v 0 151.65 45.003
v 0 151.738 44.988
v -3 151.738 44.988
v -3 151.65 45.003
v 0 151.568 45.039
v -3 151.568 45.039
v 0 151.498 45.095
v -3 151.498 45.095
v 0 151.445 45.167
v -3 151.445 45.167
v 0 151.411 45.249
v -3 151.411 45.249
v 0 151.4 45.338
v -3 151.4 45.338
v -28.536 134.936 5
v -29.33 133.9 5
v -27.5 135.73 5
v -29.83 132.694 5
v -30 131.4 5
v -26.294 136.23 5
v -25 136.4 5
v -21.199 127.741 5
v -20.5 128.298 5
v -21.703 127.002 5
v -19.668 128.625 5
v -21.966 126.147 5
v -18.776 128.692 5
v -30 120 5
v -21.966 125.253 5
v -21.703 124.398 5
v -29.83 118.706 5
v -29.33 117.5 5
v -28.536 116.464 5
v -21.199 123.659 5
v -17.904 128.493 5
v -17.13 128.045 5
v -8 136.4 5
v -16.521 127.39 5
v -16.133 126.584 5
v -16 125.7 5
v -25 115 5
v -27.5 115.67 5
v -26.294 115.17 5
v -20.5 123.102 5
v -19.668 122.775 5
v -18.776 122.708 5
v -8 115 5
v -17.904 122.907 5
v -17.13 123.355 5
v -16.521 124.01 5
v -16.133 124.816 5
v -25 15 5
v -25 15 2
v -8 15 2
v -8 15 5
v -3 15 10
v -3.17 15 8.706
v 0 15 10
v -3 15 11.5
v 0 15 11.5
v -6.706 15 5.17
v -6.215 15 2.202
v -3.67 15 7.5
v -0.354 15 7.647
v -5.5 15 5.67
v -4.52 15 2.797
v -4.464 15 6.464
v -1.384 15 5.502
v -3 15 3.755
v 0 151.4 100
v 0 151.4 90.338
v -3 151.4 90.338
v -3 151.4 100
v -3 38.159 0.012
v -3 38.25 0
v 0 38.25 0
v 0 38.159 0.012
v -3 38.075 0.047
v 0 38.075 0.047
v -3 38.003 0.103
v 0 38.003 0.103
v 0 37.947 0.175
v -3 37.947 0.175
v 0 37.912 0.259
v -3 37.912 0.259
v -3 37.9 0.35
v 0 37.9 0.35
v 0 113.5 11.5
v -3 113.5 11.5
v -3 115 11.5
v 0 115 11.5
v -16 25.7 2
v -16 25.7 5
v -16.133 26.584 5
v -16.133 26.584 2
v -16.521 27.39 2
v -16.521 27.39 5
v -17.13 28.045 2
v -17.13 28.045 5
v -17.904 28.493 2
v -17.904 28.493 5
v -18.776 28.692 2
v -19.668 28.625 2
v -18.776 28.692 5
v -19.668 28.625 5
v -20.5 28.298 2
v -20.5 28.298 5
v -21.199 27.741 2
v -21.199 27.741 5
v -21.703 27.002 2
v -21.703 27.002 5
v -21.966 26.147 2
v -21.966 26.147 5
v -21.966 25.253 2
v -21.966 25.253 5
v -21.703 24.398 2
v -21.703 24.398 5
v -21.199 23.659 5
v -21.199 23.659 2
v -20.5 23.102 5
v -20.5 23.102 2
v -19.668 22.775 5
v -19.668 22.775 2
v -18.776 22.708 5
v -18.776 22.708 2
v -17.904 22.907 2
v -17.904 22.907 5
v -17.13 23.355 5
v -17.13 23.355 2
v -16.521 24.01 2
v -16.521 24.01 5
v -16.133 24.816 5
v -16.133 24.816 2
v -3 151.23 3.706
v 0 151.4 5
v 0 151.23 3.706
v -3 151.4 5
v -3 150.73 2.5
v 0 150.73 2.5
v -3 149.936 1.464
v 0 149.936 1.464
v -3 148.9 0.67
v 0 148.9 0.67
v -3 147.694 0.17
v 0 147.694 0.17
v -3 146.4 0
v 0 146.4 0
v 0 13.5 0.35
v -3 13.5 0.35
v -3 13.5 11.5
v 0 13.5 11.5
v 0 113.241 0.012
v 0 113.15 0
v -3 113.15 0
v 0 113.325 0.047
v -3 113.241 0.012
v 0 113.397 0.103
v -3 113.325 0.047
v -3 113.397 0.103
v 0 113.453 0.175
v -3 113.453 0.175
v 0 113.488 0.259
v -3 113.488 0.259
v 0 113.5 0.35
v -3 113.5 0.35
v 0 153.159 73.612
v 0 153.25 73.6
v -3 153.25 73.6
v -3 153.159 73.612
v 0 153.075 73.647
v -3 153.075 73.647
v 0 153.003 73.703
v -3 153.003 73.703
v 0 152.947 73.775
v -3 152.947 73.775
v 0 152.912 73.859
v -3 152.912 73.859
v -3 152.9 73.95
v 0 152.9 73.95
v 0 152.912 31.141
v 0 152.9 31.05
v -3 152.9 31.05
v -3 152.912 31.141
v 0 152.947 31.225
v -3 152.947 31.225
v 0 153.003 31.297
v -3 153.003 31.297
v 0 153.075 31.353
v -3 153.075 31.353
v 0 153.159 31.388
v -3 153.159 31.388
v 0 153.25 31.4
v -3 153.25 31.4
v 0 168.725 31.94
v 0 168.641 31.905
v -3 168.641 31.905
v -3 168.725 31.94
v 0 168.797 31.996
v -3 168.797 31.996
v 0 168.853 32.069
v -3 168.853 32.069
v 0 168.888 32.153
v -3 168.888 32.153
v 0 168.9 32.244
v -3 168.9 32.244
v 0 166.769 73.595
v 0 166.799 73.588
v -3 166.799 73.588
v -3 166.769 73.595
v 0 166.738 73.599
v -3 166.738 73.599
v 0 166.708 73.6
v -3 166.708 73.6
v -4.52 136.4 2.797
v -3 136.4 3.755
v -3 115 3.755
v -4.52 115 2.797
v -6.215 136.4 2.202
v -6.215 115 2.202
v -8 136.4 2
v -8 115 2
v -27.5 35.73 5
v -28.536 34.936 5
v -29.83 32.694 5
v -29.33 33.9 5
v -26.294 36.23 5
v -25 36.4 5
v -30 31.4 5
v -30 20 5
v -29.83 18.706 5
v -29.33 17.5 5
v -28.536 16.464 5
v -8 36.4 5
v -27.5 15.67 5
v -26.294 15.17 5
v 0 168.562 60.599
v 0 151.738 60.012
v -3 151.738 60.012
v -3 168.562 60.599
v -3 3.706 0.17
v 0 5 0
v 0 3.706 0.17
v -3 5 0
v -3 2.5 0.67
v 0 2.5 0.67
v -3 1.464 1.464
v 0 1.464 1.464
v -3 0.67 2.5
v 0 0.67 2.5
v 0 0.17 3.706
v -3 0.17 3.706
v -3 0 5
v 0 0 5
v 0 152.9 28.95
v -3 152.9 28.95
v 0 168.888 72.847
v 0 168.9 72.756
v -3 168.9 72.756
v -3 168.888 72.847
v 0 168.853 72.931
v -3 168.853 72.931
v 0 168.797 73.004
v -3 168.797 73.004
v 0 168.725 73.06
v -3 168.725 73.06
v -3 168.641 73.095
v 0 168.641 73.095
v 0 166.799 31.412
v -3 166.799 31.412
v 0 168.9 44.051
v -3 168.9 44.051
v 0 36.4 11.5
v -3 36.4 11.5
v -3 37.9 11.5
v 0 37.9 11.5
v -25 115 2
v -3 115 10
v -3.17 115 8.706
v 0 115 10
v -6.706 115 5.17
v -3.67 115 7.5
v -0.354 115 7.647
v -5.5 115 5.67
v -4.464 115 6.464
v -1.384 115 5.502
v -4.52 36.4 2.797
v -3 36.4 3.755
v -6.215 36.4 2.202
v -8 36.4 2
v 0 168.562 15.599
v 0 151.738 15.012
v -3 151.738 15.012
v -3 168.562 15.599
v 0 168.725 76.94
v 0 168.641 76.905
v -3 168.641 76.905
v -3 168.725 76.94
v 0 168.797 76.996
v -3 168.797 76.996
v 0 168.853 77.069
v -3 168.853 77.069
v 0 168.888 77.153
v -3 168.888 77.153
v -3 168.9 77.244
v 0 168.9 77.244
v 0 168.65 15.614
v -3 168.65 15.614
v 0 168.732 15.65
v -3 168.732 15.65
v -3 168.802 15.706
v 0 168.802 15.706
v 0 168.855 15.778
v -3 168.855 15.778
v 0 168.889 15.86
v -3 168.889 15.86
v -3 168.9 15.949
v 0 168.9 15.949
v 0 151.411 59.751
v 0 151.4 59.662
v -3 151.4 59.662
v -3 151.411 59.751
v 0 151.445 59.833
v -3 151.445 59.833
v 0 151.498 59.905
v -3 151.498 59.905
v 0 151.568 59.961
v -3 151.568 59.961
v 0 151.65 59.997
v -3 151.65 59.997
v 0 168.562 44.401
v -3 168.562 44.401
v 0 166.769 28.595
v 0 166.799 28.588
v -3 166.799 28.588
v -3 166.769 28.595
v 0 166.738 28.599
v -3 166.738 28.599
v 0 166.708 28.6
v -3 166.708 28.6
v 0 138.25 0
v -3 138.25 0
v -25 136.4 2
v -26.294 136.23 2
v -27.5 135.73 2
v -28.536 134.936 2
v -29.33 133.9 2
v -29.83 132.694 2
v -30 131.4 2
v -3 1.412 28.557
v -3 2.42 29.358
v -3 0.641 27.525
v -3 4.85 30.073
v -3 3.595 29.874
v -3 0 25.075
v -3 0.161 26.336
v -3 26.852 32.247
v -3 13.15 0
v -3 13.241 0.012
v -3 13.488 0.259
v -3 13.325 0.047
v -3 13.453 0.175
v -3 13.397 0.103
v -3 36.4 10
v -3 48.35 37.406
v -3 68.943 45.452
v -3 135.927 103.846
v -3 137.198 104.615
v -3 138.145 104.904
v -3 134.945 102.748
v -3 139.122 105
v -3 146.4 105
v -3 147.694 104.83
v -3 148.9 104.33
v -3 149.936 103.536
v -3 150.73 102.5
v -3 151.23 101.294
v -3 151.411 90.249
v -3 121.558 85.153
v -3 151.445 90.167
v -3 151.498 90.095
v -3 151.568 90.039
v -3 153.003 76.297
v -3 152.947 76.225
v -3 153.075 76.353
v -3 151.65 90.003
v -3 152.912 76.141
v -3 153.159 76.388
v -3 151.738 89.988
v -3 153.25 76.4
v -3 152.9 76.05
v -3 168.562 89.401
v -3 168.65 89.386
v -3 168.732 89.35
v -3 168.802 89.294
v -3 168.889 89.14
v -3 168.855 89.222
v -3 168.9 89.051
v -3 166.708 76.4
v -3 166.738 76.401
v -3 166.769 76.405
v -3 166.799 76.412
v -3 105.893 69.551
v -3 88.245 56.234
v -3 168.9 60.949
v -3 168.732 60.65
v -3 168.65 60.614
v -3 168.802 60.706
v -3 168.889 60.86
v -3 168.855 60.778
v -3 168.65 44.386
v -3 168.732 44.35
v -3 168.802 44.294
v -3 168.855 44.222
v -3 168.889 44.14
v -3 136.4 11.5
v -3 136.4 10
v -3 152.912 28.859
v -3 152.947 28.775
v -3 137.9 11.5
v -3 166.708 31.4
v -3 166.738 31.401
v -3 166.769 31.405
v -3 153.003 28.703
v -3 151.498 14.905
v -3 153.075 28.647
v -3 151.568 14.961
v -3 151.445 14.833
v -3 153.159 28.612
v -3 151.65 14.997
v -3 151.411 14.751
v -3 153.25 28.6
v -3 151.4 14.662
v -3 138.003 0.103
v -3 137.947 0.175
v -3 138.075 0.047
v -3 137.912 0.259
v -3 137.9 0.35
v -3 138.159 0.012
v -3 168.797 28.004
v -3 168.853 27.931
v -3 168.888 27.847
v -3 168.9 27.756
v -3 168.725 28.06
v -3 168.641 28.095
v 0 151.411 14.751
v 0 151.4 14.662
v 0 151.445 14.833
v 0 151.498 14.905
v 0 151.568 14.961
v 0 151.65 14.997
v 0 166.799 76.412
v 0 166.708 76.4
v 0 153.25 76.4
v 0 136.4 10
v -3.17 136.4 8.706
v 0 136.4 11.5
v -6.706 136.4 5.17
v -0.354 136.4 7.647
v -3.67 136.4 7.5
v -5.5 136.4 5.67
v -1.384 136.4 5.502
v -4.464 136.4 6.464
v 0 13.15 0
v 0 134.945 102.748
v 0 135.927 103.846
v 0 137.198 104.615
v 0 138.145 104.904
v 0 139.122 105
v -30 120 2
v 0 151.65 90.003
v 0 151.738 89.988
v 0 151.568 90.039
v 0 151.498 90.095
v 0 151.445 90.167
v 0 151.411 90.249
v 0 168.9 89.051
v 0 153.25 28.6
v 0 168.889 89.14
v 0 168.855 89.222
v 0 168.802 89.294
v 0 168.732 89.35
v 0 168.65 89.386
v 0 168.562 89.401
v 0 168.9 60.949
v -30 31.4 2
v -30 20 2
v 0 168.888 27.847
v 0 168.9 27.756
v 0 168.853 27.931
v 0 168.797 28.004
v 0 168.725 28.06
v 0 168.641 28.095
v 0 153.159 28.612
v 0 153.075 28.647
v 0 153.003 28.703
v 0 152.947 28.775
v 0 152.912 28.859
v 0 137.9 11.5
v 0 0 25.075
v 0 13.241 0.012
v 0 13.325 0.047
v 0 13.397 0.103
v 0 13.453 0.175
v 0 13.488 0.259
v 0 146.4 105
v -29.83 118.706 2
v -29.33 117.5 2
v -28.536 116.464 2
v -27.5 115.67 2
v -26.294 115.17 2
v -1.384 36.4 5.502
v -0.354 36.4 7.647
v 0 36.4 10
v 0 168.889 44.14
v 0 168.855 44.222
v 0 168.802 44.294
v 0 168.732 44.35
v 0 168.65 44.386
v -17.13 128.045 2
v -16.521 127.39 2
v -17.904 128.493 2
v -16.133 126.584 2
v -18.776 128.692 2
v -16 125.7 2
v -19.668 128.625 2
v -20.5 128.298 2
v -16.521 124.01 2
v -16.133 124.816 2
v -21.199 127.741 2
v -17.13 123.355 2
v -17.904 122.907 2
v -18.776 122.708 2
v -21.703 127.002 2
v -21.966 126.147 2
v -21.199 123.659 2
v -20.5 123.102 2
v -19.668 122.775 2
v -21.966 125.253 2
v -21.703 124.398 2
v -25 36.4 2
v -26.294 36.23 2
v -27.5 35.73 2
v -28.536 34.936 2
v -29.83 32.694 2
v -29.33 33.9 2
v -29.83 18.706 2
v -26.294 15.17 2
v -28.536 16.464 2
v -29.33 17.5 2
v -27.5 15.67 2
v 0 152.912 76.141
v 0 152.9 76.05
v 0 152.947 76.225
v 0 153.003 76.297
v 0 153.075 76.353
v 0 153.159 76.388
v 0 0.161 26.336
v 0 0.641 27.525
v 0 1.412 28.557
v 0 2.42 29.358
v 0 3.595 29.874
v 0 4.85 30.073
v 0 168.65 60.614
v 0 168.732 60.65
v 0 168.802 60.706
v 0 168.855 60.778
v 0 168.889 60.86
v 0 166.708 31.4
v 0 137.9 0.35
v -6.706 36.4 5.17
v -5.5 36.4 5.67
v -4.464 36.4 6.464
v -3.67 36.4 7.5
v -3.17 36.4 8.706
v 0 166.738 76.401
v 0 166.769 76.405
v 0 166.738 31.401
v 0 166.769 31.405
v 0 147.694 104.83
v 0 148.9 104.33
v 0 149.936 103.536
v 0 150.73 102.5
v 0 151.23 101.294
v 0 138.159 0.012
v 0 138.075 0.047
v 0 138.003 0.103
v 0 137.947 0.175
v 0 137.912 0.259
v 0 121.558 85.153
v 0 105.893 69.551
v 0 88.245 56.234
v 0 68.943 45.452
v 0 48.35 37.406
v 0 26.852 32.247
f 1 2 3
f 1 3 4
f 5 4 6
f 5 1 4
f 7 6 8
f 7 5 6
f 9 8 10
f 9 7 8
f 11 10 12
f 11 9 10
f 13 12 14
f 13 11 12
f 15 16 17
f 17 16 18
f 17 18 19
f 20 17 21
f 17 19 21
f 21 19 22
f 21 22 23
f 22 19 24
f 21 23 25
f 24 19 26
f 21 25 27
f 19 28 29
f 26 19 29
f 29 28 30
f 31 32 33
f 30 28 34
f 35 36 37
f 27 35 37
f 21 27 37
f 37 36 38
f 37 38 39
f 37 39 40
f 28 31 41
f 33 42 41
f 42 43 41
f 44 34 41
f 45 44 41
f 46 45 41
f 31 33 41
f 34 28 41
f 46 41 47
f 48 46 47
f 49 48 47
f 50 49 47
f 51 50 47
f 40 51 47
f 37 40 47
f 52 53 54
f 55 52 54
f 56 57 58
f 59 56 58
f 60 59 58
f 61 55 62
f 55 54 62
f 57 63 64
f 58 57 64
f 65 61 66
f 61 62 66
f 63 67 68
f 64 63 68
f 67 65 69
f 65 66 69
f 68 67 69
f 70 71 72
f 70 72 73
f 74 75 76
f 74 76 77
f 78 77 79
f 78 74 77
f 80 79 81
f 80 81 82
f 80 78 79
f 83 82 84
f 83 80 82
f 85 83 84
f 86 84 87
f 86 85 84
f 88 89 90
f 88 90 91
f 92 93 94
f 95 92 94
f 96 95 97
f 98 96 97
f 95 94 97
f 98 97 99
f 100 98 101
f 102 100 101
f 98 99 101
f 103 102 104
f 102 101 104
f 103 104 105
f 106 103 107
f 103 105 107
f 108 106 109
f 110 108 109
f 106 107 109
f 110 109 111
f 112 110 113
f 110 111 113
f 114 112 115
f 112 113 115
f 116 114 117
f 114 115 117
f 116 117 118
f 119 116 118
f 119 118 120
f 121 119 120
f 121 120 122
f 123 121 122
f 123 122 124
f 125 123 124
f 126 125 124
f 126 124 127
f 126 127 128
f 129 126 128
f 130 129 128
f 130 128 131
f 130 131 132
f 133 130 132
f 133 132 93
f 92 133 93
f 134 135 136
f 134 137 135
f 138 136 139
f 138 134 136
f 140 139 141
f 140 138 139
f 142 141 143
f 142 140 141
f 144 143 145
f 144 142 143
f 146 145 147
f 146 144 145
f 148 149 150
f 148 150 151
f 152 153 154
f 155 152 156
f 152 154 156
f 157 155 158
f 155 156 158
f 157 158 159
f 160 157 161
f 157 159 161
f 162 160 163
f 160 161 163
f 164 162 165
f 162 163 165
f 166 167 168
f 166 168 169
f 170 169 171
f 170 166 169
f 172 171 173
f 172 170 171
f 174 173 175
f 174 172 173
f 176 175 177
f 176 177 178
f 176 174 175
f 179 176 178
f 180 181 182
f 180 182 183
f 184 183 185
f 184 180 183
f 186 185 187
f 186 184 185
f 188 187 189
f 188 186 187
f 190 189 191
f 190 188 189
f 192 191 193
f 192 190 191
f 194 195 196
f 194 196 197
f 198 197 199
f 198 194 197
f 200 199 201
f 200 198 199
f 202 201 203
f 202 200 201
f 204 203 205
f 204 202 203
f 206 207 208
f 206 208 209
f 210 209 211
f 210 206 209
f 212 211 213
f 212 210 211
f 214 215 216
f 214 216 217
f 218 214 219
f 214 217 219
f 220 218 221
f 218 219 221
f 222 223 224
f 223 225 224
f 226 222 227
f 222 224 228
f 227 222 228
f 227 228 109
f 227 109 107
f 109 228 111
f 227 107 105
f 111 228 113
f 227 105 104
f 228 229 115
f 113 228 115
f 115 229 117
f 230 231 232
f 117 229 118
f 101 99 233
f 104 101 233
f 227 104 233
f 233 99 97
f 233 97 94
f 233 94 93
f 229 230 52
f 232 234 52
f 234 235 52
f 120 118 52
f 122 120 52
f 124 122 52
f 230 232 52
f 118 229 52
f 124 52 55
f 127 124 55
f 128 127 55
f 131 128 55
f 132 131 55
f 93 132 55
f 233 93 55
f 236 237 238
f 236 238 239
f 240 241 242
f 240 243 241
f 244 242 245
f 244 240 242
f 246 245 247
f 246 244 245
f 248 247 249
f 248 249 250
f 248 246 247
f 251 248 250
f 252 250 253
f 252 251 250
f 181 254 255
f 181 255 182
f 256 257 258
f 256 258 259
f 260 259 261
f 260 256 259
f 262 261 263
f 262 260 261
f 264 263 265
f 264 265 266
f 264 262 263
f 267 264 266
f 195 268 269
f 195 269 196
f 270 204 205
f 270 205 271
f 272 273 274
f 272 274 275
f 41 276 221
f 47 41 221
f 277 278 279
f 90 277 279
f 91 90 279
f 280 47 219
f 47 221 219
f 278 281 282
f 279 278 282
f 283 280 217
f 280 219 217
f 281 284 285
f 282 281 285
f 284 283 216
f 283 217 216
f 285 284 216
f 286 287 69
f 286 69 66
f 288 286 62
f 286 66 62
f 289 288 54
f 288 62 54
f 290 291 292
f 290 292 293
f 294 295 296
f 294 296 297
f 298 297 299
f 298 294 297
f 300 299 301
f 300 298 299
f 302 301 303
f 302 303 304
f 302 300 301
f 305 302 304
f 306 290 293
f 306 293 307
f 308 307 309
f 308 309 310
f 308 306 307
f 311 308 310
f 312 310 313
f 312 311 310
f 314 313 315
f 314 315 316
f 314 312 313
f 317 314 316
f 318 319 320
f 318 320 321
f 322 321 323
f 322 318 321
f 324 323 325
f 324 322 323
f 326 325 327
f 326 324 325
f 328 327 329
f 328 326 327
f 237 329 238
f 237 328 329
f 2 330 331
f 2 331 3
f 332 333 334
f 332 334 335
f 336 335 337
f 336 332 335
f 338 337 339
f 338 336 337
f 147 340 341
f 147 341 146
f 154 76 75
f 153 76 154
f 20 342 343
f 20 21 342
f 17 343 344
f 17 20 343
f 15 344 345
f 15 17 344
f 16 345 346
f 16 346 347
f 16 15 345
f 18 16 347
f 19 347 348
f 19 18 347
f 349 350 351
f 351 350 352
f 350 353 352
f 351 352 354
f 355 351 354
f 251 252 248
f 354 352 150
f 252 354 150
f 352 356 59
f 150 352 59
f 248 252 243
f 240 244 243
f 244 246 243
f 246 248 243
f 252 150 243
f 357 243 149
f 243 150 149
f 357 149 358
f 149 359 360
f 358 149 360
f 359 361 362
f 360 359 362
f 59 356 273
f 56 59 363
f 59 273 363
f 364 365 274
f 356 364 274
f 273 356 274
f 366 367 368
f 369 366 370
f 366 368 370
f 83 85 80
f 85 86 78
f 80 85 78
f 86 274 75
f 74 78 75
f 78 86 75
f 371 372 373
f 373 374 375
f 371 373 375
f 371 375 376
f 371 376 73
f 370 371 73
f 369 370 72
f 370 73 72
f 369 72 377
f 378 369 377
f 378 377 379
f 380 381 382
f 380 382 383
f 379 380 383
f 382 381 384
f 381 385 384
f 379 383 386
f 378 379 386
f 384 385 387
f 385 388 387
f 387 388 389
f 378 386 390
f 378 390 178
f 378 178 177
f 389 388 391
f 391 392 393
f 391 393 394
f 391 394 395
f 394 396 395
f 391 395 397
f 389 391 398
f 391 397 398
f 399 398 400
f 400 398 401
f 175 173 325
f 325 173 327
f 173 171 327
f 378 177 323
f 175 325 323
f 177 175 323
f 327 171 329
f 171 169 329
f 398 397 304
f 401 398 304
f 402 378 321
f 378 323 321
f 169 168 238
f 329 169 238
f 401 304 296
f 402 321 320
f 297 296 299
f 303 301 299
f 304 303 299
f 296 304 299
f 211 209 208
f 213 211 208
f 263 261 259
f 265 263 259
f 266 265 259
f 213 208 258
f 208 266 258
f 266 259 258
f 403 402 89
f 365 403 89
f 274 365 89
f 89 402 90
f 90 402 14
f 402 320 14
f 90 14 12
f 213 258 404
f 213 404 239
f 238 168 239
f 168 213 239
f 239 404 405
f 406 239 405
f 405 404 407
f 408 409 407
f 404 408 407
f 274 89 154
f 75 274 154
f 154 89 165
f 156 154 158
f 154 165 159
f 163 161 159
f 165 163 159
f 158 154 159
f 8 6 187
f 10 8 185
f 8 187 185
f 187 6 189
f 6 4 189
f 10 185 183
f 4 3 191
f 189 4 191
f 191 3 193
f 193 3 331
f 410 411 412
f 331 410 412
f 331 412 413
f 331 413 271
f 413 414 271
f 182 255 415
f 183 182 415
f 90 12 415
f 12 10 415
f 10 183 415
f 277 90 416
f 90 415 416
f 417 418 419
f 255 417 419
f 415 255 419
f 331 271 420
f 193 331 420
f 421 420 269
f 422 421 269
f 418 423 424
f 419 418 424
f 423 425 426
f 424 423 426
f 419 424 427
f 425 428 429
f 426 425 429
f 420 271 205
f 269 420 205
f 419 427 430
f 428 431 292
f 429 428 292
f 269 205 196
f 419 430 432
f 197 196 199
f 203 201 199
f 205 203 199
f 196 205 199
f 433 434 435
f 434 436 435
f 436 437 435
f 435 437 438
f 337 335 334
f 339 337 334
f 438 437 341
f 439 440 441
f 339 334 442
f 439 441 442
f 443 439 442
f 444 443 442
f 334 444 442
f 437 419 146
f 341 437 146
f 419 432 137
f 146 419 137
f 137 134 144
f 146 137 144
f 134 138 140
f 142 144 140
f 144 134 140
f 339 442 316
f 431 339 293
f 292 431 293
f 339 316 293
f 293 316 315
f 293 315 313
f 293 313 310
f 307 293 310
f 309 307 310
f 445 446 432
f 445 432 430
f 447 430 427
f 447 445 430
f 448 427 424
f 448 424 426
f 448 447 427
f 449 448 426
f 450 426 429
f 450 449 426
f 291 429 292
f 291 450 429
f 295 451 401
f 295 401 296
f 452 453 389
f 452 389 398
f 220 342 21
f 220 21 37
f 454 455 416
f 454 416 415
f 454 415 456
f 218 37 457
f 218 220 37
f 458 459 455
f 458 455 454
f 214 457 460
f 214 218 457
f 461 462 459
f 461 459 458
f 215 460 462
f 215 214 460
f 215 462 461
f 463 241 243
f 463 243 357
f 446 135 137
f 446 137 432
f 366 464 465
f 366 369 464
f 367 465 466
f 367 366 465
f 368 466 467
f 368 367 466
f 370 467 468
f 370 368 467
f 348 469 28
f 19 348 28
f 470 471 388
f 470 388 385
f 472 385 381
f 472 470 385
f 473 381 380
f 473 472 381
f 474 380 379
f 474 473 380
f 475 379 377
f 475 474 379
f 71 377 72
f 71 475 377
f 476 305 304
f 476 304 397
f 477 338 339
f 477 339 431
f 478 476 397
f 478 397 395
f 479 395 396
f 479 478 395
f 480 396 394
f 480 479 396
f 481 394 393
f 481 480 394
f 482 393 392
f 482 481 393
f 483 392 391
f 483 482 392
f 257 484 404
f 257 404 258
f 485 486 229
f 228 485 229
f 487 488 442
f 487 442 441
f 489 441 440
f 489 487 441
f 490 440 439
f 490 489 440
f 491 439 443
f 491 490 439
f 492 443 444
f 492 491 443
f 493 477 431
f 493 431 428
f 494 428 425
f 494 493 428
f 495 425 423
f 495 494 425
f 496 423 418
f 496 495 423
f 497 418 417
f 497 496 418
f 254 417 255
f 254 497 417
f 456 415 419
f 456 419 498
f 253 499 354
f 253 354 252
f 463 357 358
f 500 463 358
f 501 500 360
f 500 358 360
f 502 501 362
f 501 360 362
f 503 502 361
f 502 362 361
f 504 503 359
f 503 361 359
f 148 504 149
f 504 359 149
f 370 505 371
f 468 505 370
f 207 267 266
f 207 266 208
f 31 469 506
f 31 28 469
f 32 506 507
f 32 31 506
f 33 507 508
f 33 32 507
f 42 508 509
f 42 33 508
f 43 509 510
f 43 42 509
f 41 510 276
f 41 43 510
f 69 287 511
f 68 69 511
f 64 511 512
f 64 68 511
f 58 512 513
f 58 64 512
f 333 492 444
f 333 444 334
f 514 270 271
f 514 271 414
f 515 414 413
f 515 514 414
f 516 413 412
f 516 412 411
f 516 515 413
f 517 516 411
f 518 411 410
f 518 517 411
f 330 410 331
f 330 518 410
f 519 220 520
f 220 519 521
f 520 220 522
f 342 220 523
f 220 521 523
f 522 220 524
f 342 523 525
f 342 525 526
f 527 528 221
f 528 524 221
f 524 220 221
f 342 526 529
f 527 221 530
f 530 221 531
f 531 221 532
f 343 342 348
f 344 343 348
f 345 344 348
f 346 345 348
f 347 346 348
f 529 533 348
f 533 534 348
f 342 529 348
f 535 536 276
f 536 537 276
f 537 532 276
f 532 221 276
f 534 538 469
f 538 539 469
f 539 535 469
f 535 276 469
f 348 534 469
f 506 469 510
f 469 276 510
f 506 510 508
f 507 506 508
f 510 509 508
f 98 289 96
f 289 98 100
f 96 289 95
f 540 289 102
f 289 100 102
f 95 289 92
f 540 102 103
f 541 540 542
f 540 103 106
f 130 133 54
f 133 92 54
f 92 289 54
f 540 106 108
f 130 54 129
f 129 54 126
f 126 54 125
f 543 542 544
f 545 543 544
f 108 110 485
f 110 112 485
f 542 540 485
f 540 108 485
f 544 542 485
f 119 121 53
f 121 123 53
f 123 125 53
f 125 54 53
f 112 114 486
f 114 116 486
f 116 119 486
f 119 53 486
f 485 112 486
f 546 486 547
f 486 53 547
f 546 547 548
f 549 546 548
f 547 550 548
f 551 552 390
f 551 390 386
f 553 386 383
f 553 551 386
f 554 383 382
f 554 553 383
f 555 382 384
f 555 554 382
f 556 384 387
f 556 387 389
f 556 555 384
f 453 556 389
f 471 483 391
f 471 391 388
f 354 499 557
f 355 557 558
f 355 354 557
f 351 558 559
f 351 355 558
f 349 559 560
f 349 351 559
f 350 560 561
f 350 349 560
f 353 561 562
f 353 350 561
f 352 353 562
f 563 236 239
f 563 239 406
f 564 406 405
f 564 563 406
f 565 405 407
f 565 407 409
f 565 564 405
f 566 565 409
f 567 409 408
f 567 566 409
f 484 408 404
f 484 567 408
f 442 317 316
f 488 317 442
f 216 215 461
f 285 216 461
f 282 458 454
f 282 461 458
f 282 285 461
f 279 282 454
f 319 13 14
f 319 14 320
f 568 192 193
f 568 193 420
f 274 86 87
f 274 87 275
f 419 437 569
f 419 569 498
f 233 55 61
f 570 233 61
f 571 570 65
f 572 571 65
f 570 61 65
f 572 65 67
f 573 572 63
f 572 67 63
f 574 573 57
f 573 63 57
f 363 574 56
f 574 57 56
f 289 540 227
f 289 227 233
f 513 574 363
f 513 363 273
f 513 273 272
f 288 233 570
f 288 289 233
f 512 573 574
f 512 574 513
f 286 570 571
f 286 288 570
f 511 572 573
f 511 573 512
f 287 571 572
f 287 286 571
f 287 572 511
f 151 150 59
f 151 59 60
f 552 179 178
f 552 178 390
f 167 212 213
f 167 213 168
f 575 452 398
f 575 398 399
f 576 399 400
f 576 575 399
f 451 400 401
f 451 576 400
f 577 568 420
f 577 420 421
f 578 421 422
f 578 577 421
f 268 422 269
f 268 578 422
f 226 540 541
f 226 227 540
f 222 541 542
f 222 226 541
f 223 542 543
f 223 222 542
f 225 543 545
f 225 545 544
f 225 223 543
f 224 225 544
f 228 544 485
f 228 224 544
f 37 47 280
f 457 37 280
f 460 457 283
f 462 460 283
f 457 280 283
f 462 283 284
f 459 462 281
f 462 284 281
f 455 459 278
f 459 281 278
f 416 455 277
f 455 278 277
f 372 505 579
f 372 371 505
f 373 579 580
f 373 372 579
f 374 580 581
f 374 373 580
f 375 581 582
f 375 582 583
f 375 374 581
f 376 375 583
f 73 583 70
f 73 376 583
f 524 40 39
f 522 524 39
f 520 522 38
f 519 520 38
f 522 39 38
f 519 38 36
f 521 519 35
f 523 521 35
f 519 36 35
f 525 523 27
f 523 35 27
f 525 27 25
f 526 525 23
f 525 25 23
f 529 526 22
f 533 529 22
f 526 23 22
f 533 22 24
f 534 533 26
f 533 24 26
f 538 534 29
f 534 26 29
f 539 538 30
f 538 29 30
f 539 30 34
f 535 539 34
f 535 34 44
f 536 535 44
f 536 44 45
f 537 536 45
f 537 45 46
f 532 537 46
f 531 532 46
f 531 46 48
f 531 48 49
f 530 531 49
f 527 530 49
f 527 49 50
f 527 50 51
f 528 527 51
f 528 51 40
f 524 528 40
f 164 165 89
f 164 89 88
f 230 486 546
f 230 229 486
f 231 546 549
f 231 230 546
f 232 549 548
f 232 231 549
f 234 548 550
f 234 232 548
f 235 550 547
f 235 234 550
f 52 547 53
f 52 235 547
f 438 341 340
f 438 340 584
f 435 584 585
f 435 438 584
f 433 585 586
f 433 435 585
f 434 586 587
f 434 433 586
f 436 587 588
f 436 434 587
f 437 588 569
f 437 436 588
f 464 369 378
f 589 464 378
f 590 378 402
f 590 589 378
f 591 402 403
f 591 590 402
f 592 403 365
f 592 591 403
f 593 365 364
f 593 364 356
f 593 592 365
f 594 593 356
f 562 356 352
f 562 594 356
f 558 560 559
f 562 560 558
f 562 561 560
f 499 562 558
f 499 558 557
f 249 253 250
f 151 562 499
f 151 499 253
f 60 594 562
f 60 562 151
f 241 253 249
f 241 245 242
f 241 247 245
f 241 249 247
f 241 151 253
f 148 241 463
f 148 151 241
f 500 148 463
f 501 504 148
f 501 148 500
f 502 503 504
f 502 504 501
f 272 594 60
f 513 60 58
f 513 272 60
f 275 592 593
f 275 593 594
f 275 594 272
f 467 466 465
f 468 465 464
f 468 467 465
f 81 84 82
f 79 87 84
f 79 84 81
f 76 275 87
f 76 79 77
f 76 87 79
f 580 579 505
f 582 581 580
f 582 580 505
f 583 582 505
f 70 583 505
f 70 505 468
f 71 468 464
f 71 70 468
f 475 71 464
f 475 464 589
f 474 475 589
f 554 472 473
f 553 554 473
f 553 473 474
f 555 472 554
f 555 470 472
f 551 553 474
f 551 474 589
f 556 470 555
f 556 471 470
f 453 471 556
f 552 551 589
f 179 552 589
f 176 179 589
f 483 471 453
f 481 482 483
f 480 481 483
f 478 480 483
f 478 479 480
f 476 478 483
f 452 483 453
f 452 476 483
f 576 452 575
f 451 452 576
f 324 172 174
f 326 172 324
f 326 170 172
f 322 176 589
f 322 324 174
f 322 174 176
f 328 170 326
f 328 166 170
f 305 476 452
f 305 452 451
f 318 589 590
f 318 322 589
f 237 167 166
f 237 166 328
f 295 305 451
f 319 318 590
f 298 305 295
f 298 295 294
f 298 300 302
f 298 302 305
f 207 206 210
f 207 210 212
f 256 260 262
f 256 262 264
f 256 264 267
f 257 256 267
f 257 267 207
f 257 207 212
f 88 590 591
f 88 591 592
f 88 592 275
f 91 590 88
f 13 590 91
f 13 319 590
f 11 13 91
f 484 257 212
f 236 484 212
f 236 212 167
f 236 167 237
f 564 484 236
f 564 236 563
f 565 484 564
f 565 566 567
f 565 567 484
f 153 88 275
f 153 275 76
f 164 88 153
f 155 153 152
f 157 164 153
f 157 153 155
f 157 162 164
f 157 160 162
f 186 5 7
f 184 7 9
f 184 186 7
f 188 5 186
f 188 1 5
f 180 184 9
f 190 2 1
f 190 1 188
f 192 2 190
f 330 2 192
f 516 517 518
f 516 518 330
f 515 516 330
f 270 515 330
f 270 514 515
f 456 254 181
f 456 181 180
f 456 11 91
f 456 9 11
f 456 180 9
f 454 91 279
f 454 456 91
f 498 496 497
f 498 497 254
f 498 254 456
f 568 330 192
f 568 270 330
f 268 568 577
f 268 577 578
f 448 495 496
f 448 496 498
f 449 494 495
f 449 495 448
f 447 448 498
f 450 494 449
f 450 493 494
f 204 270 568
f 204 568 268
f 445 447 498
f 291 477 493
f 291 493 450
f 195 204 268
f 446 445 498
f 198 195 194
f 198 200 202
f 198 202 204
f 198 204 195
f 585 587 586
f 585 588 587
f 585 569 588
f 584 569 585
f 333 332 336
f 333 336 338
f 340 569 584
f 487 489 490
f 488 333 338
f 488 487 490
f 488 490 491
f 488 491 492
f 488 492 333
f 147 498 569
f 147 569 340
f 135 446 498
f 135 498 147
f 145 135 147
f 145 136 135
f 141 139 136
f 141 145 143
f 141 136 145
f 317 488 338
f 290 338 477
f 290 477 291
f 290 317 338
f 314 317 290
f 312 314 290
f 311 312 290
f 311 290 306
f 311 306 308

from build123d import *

# Parameters (mm, degrees)
BASE_FLANGE1_DEPTH   = 3
EDGE_FLANGE1_START   = 13.5
EDGE_FLANGE1_DEPTH   = 24.4
EDGE_FLANGE1_START_2 = 113.5
EDGE_FLANGE1_2_DEPTH = 24.4
EDGE_FLANGE1_3_DEPTH = 1.5
EDGE_FLANGE1_START_3 = 36.4
EDGE_FLANGE1_4_DEPTH = 1.5
EDGE_FLANGE1_5_DEPTH = 1.5
EDGE_FLANGE1_START_4 = 136.4
EDGE_FLANGE1_6_DEPTH = 1.5
EDGE_FLANGE1_START_5 = 15
EDGE_FLANGE1_7_DEPTH = 21.4
EDGE_FLANGE1_START_6 = 115
EDGE_FLANGE1_8_DEPTH = 21.4
SKETCH12_R           = 3
CUT_EXTRUDE1_DEPTH   = 199.562861583
CUT_EXTRUDE2_DEPTH   = 201.701793714
FILLET1_R            = 5


# Read off the part's stored shape, not the designer's step: Edge-Flange1
# Sheet-metal steps are written as plain solids
with BuildPart() as part:
    # Sketch1 → Base-Flange1 (new body)
    with BuildSketch(Plane(origin=(0, 0, 0), x_dir=(0, 0, -1), z_dir=(1, 0, 0))):
        with BuildLine():
            Line((-89.400682252, 168.562214824), (-89.988204282, 151.737785176))
            ThreePointArc((-89.988204282, 151.737785176), (-90.094860642, 151.49823107), (-90.337991071, 151.4))
            Line((-90.337991071, 151.4), (-104.65, 151.4))
            Line((-104.65, 151.4), (-105, 151.4))
            Line((-105, 151.4), (-105, 151.05))
            Line((-105, 151.05), (-105, 136.592313107))
            Line((-105, 136.592313107), (-105, 136.4))
            Line((-105, 136.4), (-104.837845918, 136.296993093))
            ThreePointArc((-104.837845918, 136.296993093), (-50.024333792, 77.898717236), (-30.000377542, 0.349243281))
            Line((-30.000377542, 0.349243281), (-30, 0))
            Line((-30, 0), (-29.65037836, 0))
            Line((-29.65037836, 0), (-0.35, 0))
            Line((-0.35, 0), (0, 0))
            Line((0, 0), (0, 0.35))
            Line((0, 0.35), (0, 14.65))
            ThreePointArc((0, 14.65), (-0.102512627, 14.897487373), (-0.35, 15))
            Line((-0.35, 15), (-2, 15))
            Line((-2, 15), (-2, 15.7))
            Line((-2, 15.7), (-2, 35.7))
            Line((-2, 35.7), (-2, 36.4))
            Line((-2, 36.4), (-0.35, 36.4))
            ThreePointArc((-0.35, 36.4), (-0.102512627, 36.502512627), (0, 36.75))
            Line((0, 36.75), (0, 114.65))
            ThreePointArc((0, 114.65), (-0.102512627, 114.897487373), (-0.35, 115))
            Line((-0.35, 115), (-2, 115))
            Line((-2, 115), (-2, 115.7))
            Line((-2, 115.7), (-2, 135.7))
            Line((-2, 135.7), (-2, 136.4))
            Line((-2, 136.4), (-0.35, 136.4))
            ThreePointArc((-0.35, 136.4), (-0.102512627, 136.502512627), (0, 136.75))
            Line((0, 136.75), (0, 151.05))
            Line((0, 151.05), (0, 151.4))
            Line((0, 151.4), (-0.35, 151.4))
            Line((-0.35, 151.4), (-14.662008929, 151.4))
            ThreePointArc((-14.662008929, 151.4), (-14.905139358, 151.49823107), (-15.011795718, 151.737785176))
            Line((-15.011795718, 151.737785176), (-15.599317748, 168.562214824))
            ThreePointArc((-15.599317748, 168.562214824), (-15.705974108, 168.80176893), (-15.949104537, 168.9))
            Line((-15.949104537, 168.9), (-27.756435554, 168.9))
            ThreePointArc((-27.756435554, 168.9), (-27.969502054, 168.827673669), (-28.094509593, 168.640586666))
            Line((-28.094509593, 168.640586666), (-28.588074039, 166.798579077))
            ThreePointArc((-28.588074039, 166.798579077), (-28.597005701, 166.753676579), (-28.6, 166.707992411))
            Line((-28.6, 166.707992411), (-28.6, 153.25))
            ThreePointArc((-28.6, 153.25), (-28.702512627, 153.002512627), (-28.95, 152.9))
            Line((-28.95, 152.9), (-31.05, 152.9))
            ThreePointArc((-31.05, 152.9), (-31.297487373, 153.002512627), (-31.4, 153.25))
            Line((-31.4, 153.25), (-31.4, 166.707992411))
            ThreePointArc((-31.4, 166.707992411), (-31.402994299, 166.753676579), (-31.411925961, 166.798579077))
            Line((-31.411925961, 166.798579077), (-31.905490407, 168.640586666))
            ThreePointArc((-31.905490407, 168.640586666), (-32.030497946, 168.827673669), (-32.243564446, 168.9))
            Line((-32.243564446, 168.9), (-44.050895463, 168.9))
            ThreePointArc((-44.050895463, 168.9), (-44.294025892, 168.80176893), (-44.400682252, 168.562214824))
            Line((-44.400682252, 168.562214824), (-44.988204282, 151.737785176))
            ThreePointArc((-44.988204282, 151.737785176), (-45.094860642, 151.49823107), (-45.337991071, 151.4))
            Line((-45.337991071, 151.4), (-59.662008929, 151.4))
            ThreePointArc((-59.662008929, 151.4), (-59.905139358, 151.49823107), (-60.011795718, 151.737785176))
            Line((-60.011795718, 151.737785176), (-60.599317748, 168.562214824))
            ThreePointArc((-60.599317748, 168.562214824), (-60.705974108, 168.80176893), (-60.949104537, 168.9))
            Line((-60.949104537, 168.9), (-72.756435554, 168.9))
            ThreePointArc((-72.756435554, 168.9), (-72.969502054, 168.827673669), (-73.094509593, 168.640586666))
            Line((-73.094509593, 168.640586666), (-73.588074039, 166.798579077))
            ThreePointArc((-73.588074039, 166.798579077), (-73.597005701, 166.753676579), (-73.6, 166.707992411))
            Line((-73.6, 166.707992411), (-73.6, 153.25))
            ThreePointArc((-73.6, 153.25), (-73.702512627, 153.002512627), (-73.95, 152.9))
            Line((-73.95, 152.9), (-76.05, 152.9))
            ThreePointArc((-76.05, 152.9), (-76.297487373, 153.002512627), (-76.4, 153.25))
            Line((-76.4, 153.25), (-76.4, 166.707992411))
            ThreePointArc((-76.4, 166.707992411), (-76.402994299, 166.753676579), (-76.411925961, 166.798579077))
            Line((-76.411925961, 166.798579077), (-76.905490407, 168.640586666))
            ThreePointArc((-76.905490407, 168.640586666), (-77.030497946, 168.827673669), (-77.243564446, 168.9))
            Line((-77.243564446, 168.9), (-89.050895463, 168.9))
            ThreePointArc((-89.050895463, 168.9), (-89.294025892, 168.80176893), (-89.400682252, 168.562214824))
        make_face()
    extrude(amount=-BASE_FLANGE1_DEPTH)

    # Edge-Flange1 outline → Edge-Flange1 (cut)
    with BuildSketch(Plane(origin=(0, 0, 0), x_dir=(1, 0, 0), z_dir=(0, 1, 0)).offset(EDGE_FLANGE1_START)):
        with BuildLine():
            Line((0, -2), (-3, -2))
            Line((-3, -2), (-3, -3.755002002))
            ThreePointArc((-3, -3.755002002), (-0.788897449, -6.535898385), (0, -10))
            Line((0, -10), (0, -2))
        make_face()
    extrude(amount=EDGE_FLANGE1_DEPTH, mode=Mode.SUBTRACT)

    # Edge-Flange1 2 outline → Edge-Flange1 2 (cut)
    with BuildSketch(Plane(origin=(0, 0, 0), x_dir=(1, 0, 0), z_dir=(0, 1, 0)).offset(EDGE_FLANGE1_START_2)):
        with BuildLine():
            Line((0, -2), (-3, -2))
            Line((-3, -2), (-3, -3.755002002))
            ThreePointArc((-3, -3.755002002), (-0.788897449, -6.535898385), (0, -10))
            Line((0, -10), (0, -2))
        make_face()
    extrude(amount=EDGE_FLANGE1_2_DEPTH, mode=Mode.SUBTRACT)

    # Edge-Flange1 3 outline → Edge-Flange1 3 (cut)
    with BuildSketch(Plane(origin=(0, 0, 0), x_dir=(1, 0, 0), z_dir=(0, 1, 0)).offset(EDGE_FLANGE1_START)):
        with BuildLine():
            ThreePointArc((0, -10), (-0.788897449, -6.535898385), (-3, -3.755002002))
            Line((-3, -3.755002002), (-3, -11.5))
            Line((-3, -11.5), (0, -11.5))
            Line((0, -11.5), (0, -10))
        make_face()
    extrude(amount=EDGE_FLANGE1_3_DEPTH, mode=Mode.SUBTRACT)

    # Edge-Flange1 4 outline → Edge-Flange1 4 (cut)
    with BuildSketch(Plane(origin=(0, 0, 0), x_dir=(1, 0, 0), z_dir=(0, 1, 0)).offset(EDGE_FLANGE1_START_3)):
        with BuildLine():
            ThreePointArc((0, -10), (-0.788897449, -6.535898385), (-3, -3.755002002))
            Line((-3, -3.755002002), (-3, -11.5))
            Line((-3, -11.5), (0, -11.5))
            Line((0, -11.5), (0, -10))
        make_face()
    extrude(amount=EDGE_FLANGE1_4_DEPTH, mode=Mode.SUBTRACT)

    # Edge-Flange1 5 outline → Edge-Flange1 5 (cut)
    with BuildSketch(Plane(origin=(0, 0, 0), x_dir=(1, 0, 0), z_dir=(0, 1, 0)).offset(EDGE_FLANGE1_START_2)):
        with BuildLine():
            ThreePointArc((0, -10), (-0.788897449, -6.535898385), (-3, -3.755002002))
            Line((-3, -3.755002002), (-3, -11.5))
            Line((-3, -11.5), (0, -11.5))
            Line((0, -11.5), (0, -10))
        make_face()
    extrude(amount=EDGE_FLANGE1_5_DEPTH, mode=Mode.SUBTRACT)

    # Edge-Flange1 6 outline → Edge-Flange1 6 (cut)
    with BuildSketch(Plane(origin=(0, 0, 0), x_dir=(1, 0, 0), z_dir=(0, 1, 0)).offset(EDGE_FLANGE1_START_4)):
        with BuildLine():
            ThreePointArc((0, -10), (-0.788897449, -6.535898385), (-3, -3.755002002))
            Line((-3, -3.755002002), (-3, -11.5))
            Line((-3, -11.5), (0, -11.5))
            Line((0, -11.5), (0, -10))
        make_face()
    extrude(amount=EDGE_FLANGE1_6_DEPTH, mode=Mode.SUBTRACT)

    # Edge-Flange1 7 outline → Edge-Flange1 7 (add)
    with BuildSketch(Plane(origin=(0, 0, 0), x_dir=(1, 0, 0), z_dir=(0, 1, 0)).offset(EDGE_FLANGE1_START_5)):
        with BuildLine():
            Line((-3, -10), (-3, -3.755002002))
            ThreePointArc((-3, -3.755002002), (-5.350470229, -2.451490744), (-8, -2))
            Line((-8, -2), (-30, -2))
            Line((-30, -2), (-30, -5))
            Line((-30, -5), (-8, -5))
            ThreePointArc((-8, -5), (-4.464466094, -6.464466094), (-3, -10))
        make_face()
    extrude(amount=EDGE_FLANGE1_7_DEPTH)

    # Edge-Flange1 8 outline → Edge-Flange1 8 (add)
    with BuildSketch(Plane(origin=(0, 0, 0), x_dir=(1, 0, 0), z_dir=(0, 1, 0)).offset(EDGE_FLANGE1_START_6)):
        with BuildLine():
            Line((-3, -10), (-3, -3.755002002))
            ThreePointArc((-3, -3.755002002), (-5.350470229, -2.451490744), (-8, -2))
            Line((-8, -2), (-30, -2))
            Line((-30, -2), (-30, -5))
            Line((-30, -5), (-8, -5))
            ThreePointArc((-8, -5), (-4.464466094, -6.464466094), (-3, -10))
        make_face()
    extrude(amount=EDGE_FLANGE1_8_DEPTH)

    # Sketch12 → Cut-Extrude1 (cut, through all)
    with BuildSketch(Plane.XY.offset(5)):
        with Locations((-19, 125.7)):
            Circle(SKETCH12_R)
        with Locations((-19, 25.7)):
            Circle(SKETCH12_R)
    extrude(amount=-CUT_EXTRUDE1_DEPTH, mode=Mode.SUBTRACT)

    # Sketch14 → Cut-Extrude2 (cut, through all)
    with BuildSketch(Plane.ZY.offset(3)):
        with BuildLine():
            Line((2, 136.4), (0, 136.4))
            Line((0, 136.4), (0, 137.9))
            Line((0, 137.9), (0, 138.25))
            ThreePointArc((0, 138.25), (0.102512627, 138.002512627), (0.35, 137.9))
            Line((0.35, 137.9), (2, 137.9))
            Line((2, 137.9), (2, 136.4))
        make_face()
        with BuildLine():
            Line((2, 115), (0, 115))
            Line((0, 115), (0, 113.5))
            Line((0, 113.5), (0, 113.15))
            ThreePointArc((0, 113.15), (0.102512627, 113.397487373), (0.35, 113.5))
            Line((0.35, 113.5), (2, 113.5))
            Line((2, 113.5), (2, 115))
        make_face()
        with BuildLine():
            Line((2, 36.4), (0, 36.4))
            Line((0, 36.4), (0, 37.9))
            Line((0, 37.9), (0, 38.25))
            ThreePointArc((0, 38.25), (0.102512627, 38.002512627), (0.35, 37.9))
            Line((0.35, 37.9), (2, 37.9))
            Line((2, 37.9), (2, 36.4))
        make_face()
        with BuildLine():
            Line((2, 13.5), (2, 15))
            Line((2, 15), (0, 15))
            Line((0, 15), (0, 13.5))
            Line((0, 13.5), (0, 13.15))
            ThreePointArc((0, 13.15), (0.102512627, 13.397487373), (0.35, 13.5))
            Line((0.35, 13.5), (2, 13.5))
        make_face()
    extrude(amount=-CUT_EXTRUDE2_DEPTH, mode=Mode.SUBTRACT)

    # Fillet1
    fillet1_edges = [part.edges().sort_by_distance(p)[0] for p in [
        (-1.5, 136.4, 105),
        (-1.5, 151.4, 105),
        (-1.5, 151.4, 0),
        (-30, 115, 3.5),
        (-30, 136.4, 3.5),
        (-30, 36.4, 3.5),
        (-30, 15, 3.5),
        (-1.5, 0, 30),
        (-1.5, 0, 0),
    ]]
    fillet(fillet1_edges, radius=FILLET1_R)


solid = part.part
